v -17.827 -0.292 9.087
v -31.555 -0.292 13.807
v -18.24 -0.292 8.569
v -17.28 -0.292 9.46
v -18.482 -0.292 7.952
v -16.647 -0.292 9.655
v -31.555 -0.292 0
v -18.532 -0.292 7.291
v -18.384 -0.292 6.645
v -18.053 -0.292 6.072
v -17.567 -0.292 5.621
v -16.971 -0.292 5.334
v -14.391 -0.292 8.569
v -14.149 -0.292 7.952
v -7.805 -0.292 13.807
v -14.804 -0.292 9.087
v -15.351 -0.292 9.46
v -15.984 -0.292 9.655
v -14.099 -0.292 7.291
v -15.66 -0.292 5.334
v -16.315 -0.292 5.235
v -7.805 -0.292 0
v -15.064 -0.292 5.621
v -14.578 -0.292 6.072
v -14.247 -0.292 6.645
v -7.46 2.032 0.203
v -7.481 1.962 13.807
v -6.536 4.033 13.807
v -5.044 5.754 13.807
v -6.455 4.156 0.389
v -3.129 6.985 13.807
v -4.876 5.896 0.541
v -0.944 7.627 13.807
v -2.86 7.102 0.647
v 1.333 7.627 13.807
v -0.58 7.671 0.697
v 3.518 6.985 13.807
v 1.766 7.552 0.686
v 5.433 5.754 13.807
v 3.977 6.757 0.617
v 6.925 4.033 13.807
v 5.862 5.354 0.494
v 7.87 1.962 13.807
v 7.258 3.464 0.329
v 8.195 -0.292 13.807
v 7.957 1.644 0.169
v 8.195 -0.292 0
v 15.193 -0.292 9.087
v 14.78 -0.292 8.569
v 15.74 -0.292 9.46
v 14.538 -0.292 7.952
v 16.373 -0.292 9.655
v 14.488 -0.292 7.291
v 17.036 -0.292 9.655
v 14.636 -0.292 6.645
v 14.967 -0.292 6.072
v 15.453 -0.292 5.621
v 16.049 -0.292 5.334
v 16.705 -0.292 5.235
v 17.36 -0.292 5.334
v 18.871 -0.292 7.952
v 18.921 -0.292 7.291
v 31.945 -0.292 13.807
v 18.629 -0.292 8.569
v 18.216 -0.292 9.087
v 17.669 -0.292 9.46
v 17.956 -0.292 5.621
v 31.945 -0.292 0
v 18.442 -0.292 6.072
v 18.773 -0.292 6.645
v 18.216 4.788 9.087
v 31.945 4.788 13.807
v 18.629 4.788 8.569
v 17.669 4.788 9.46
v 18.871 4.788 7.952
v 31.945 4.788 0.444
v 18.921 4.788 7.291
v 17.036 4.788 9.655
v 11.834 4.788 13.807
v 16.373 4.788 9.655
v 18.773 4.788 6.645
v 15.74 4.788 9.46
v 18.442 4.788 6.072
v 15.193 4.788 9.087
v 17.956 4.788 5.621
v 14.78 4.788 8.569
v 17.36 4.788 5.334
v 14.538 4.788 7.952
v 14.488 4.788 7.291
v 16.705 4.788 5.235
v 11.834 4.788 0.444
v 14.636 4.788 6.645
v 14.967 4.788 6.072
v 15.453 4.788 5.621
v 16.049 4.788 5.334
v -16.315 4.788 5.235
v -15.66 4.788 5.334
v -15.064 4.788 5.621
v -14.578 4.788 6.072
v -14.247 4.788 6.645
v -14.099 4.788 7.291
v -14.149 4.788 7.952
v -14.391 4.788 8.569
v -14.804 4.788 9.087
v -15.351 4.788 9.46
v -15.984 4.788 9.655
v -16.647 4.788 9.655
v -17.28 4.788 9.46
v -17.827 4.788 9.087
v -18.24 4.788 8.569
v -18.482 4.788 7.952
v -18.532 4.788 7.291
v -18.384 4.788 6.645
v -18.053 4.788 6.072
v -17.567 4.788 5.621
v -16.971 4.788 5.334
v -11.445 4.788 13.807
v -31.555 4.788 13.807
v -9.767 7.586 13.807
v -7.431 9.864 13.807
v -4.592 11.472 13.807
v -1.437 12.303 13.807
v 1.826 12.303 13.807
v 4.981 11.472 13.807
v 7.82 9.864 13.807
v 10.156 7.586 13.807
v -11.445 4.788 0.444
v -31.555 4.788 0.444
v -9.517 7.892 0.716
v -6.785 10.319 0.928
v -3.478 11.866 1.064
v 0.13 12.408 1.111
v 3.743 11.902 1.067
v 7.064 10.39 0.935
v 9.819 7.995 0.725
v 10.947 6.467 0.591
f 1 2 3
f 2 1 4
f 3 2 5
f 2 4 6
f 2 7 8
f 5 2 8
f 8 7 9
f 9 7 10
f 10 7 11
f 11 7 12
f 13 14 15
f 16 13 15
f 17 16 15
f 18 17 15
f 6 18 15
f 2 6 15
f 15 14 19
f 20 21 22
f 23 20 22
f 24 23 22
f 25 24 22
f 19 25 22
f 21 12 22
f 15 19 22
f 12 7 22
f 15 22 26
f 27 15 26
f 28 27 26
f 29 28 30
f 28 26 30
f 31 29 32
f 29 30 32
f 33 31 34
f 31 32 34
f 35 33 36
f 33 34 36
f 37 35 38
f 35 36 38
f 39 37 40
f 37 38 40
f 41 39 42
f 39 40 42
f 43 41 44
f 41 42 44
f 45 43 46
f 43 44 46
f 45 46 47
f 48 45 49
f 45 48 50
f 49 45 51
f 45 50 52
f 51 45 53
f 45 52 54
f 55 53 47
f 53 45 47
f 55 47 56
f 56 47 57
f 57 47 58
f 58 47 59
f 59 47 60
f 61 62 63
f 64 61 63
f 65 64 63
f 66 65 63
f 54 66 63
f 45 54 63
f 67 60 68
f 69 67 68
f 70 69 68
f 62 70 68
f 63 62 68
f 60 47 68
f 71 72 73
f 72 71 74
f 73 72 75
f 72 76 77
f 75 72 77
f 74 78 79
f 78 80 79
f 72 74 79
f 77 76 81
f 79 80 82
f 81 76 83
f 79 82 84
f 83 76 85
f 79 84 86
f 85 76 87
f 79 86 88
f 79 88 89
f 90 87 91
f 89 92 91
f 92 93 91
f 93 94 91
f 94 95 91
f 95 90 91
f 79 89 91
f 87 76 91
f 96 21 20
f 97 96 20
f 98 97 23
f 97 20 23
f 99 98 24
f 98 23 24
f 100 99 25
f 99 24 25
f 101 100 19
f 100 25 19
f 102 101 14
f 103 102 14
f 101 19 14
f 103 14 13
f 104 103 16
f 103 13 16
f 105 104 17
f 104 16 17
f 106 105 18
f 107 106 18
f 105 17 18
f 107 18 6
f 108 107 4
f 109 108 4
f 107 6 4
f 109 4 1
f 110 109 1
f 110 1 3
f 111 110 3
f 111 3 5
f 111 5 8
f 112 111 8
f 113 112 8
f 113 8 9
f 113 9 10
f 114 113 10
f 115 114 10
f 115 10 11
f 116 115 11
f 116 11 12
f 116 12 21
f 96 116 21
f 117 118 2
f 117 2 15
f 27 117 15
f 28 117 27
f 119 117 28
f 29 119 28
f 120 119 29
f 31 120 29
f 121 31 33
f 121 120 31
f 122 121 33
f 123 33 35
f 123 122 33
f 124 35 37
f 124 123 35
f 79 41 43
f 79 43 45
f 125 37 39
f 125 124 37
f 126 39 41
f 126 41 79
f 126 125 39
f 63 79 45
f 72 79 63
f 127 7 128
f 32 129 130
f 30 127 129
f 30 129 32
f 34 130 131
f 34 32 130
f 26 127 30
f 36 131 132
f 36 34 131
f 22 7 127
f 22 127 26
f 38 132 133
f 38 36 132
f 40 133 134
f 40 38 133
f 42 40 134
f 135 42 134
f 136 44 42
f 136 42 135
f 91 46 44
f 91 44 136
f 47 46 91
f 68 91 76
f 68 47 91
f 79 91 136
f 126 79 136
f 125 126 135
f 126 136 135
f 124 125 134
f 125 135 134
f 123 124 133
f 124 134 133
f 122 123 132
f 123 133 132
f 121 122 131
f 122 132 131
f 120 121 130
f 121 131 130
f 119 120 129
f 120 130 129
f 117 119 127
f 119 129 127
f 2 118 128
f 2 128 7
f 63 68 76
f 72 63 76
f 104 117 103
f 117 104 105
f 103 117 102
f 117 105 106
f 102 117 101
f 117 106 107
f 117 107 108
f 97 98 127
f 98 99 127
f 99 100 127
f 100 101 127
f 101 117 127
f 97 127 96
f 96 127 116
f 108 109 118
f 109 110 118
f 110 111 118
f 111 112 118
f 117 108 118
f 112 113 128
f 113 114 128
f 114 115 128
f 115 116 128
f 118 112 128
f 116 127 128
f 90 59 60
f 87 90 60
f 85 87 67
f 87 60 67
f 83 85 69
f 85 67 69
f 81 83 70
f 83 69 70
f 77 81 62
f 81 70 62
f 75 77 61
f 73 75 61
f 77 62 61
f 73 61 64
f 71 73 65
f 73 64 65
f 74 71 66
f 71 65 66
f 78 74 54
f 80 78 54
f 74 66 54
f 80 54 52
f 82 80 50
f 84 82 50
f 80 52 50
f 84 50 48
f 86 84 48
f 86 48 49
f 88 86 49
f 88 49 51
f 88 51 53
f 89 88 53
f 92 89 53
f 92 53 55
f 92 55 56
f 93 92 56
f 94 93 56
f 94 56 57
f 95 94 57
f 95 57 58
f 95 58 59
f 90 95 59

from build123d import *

# Parameters (mm, degrees)
BOSS_EXTRUDE2_DEPTH    = 13.80744
CUT_EXTRUDE1_START     = -0.02543021
CUT_EXTRUDE1_OUTLINE_W = 66
CUT_EXTRUDE1_OUTLINE_H = 16
CUT_EXTRUDE1_DEPTH     = 1.106877933
CUT_EXTRUDE2_REACH     = 39.046
SKETCH4_R              = 2.2225


# Read off the part's stored shape, not the designer's step: Cut-Extrude1
with BuildPart() as part:
    # Sketch2 → Boss-Extrude2 (new body)
    with BuildSketch(Plane.XY):
        with BuildLine():
            ThreePointArc((-11.445222977, 4.788221067), (-12.237590886, 2.302953542), (-12.505480711, -0.291778933))
            Line((-12.505480711, -0.291778933), (-7.805480711, -0.291778933))
            ThreePointArc((-7.805480711, -0.291778933), (0.194519289, 7.708221067), (8.194519289, -0.291778933))
            Line((8.194519289, -0.291778933), (12.894519289, -0.291778933))
            ThreePointArc((12.894519289, -0.291778933), (12.626629463, 2.302953542), (11.834261554, 4.788221067))
            ThreePointArc((11.834261554, 4.788221067), (0.194519289, 12.408221067), (-11.445222977, 4.788221067))
        make_face()
        with BuildLine():
            Line((-31.555480711, -0.291778933), (-12.505480711, -0.291778933))
            ThreePointArc((-12.505480711, -0.291778933), (-12.237590886, 2.302953542), (-11.445222977, 4.788221067))
            Line((-11.445222977, 4.788221067), (-31.555480711, 4.788221067))
            Line((-31.555480711, 4.788221067), (-31.555480711, -0.291778933))
        make_face()
        with BuildLine():
            ThreePointArc((11.834261554, 4.788221067), (12.626629463, 2.302953542), (12.894519289, -0.291778933))
            Line((12.894519289, -0.291778933), (31.944519289, -0.291778933))
            Line((31.944519289, -0.291778933), (31.944519289, 4.788221067))
            Line((31.944519289, 4.788221067), (11.834261554, 4.788221067))
        make_face()
    extrude(amount=BOSS_EXTRUDE2_DEPTH)

    # Cut-Extrude1 outline → Cut-Extrude1 (cut)
    with BuildSketch(Plane(origin=(0, 0, 0), x_dir=(1, 0, 0), z_dir=(0, 0.08715574274765836, -0.9961946980917455)).offset(CUT_EXTRUDE1_START)):
        with Locations((0, -6)):
            Rectangle(CUT_EXTRUDE1_OUTLINE_W, CUT_EXTRUDE1_OUTLINE_H)
    extrude(amount=CUT_EXTRUDE1_DEPTH, mode=Mode.SUBTRACT)

    # Sketch4 → Cut-Extrude2 (cut, up to next)
    with BuildSketch(Plane.XZ.offset(0.291778933), mode=Mode.PRIVATE) as cut_extrude2_sk1:
        with Locations(Location((-16.315480711, 7.45744, 0), (0, 0, 270))):
            Circle(SKETCH4_R)
    cut_extrude2_tool1 = extrude(cut_extrude2_sk1.sketch, amount=-CUT_EXTRUDE2_REACH, mode=Mode.PRIVATE) & part.part
    # Sketch4 → Cut-Extrude2 (cut, up to next)
    with BuildSketch(Plane.XZ.offset(0.291778933), mode=Mode.PRIVATE) as cut_extrude2_sk2:
        with Locations(Location((16.704519289, 7.45744, 0), (0, 0, 270))):
            Circle(SKETCH4_R)
    cut_extrude2_tool2 = extrude(cut_extrude2_sk2.sketch, amount=-CUT_EXTRUDE2_REACH, mode=Mode.PRIVATE) & part.part
    add(cut_extrude2_tool1.solids().sort_by_distance((-16.315481, -0.291779, 7.45744))[0], mode=Mode.SUBTRACT)
    add(cut_extrude2_tool2.solids().sort_by_distance((16.704519, -0.291779, 7.45744))[0], mode=Mode.SUBTRACT)


solid = part.part
